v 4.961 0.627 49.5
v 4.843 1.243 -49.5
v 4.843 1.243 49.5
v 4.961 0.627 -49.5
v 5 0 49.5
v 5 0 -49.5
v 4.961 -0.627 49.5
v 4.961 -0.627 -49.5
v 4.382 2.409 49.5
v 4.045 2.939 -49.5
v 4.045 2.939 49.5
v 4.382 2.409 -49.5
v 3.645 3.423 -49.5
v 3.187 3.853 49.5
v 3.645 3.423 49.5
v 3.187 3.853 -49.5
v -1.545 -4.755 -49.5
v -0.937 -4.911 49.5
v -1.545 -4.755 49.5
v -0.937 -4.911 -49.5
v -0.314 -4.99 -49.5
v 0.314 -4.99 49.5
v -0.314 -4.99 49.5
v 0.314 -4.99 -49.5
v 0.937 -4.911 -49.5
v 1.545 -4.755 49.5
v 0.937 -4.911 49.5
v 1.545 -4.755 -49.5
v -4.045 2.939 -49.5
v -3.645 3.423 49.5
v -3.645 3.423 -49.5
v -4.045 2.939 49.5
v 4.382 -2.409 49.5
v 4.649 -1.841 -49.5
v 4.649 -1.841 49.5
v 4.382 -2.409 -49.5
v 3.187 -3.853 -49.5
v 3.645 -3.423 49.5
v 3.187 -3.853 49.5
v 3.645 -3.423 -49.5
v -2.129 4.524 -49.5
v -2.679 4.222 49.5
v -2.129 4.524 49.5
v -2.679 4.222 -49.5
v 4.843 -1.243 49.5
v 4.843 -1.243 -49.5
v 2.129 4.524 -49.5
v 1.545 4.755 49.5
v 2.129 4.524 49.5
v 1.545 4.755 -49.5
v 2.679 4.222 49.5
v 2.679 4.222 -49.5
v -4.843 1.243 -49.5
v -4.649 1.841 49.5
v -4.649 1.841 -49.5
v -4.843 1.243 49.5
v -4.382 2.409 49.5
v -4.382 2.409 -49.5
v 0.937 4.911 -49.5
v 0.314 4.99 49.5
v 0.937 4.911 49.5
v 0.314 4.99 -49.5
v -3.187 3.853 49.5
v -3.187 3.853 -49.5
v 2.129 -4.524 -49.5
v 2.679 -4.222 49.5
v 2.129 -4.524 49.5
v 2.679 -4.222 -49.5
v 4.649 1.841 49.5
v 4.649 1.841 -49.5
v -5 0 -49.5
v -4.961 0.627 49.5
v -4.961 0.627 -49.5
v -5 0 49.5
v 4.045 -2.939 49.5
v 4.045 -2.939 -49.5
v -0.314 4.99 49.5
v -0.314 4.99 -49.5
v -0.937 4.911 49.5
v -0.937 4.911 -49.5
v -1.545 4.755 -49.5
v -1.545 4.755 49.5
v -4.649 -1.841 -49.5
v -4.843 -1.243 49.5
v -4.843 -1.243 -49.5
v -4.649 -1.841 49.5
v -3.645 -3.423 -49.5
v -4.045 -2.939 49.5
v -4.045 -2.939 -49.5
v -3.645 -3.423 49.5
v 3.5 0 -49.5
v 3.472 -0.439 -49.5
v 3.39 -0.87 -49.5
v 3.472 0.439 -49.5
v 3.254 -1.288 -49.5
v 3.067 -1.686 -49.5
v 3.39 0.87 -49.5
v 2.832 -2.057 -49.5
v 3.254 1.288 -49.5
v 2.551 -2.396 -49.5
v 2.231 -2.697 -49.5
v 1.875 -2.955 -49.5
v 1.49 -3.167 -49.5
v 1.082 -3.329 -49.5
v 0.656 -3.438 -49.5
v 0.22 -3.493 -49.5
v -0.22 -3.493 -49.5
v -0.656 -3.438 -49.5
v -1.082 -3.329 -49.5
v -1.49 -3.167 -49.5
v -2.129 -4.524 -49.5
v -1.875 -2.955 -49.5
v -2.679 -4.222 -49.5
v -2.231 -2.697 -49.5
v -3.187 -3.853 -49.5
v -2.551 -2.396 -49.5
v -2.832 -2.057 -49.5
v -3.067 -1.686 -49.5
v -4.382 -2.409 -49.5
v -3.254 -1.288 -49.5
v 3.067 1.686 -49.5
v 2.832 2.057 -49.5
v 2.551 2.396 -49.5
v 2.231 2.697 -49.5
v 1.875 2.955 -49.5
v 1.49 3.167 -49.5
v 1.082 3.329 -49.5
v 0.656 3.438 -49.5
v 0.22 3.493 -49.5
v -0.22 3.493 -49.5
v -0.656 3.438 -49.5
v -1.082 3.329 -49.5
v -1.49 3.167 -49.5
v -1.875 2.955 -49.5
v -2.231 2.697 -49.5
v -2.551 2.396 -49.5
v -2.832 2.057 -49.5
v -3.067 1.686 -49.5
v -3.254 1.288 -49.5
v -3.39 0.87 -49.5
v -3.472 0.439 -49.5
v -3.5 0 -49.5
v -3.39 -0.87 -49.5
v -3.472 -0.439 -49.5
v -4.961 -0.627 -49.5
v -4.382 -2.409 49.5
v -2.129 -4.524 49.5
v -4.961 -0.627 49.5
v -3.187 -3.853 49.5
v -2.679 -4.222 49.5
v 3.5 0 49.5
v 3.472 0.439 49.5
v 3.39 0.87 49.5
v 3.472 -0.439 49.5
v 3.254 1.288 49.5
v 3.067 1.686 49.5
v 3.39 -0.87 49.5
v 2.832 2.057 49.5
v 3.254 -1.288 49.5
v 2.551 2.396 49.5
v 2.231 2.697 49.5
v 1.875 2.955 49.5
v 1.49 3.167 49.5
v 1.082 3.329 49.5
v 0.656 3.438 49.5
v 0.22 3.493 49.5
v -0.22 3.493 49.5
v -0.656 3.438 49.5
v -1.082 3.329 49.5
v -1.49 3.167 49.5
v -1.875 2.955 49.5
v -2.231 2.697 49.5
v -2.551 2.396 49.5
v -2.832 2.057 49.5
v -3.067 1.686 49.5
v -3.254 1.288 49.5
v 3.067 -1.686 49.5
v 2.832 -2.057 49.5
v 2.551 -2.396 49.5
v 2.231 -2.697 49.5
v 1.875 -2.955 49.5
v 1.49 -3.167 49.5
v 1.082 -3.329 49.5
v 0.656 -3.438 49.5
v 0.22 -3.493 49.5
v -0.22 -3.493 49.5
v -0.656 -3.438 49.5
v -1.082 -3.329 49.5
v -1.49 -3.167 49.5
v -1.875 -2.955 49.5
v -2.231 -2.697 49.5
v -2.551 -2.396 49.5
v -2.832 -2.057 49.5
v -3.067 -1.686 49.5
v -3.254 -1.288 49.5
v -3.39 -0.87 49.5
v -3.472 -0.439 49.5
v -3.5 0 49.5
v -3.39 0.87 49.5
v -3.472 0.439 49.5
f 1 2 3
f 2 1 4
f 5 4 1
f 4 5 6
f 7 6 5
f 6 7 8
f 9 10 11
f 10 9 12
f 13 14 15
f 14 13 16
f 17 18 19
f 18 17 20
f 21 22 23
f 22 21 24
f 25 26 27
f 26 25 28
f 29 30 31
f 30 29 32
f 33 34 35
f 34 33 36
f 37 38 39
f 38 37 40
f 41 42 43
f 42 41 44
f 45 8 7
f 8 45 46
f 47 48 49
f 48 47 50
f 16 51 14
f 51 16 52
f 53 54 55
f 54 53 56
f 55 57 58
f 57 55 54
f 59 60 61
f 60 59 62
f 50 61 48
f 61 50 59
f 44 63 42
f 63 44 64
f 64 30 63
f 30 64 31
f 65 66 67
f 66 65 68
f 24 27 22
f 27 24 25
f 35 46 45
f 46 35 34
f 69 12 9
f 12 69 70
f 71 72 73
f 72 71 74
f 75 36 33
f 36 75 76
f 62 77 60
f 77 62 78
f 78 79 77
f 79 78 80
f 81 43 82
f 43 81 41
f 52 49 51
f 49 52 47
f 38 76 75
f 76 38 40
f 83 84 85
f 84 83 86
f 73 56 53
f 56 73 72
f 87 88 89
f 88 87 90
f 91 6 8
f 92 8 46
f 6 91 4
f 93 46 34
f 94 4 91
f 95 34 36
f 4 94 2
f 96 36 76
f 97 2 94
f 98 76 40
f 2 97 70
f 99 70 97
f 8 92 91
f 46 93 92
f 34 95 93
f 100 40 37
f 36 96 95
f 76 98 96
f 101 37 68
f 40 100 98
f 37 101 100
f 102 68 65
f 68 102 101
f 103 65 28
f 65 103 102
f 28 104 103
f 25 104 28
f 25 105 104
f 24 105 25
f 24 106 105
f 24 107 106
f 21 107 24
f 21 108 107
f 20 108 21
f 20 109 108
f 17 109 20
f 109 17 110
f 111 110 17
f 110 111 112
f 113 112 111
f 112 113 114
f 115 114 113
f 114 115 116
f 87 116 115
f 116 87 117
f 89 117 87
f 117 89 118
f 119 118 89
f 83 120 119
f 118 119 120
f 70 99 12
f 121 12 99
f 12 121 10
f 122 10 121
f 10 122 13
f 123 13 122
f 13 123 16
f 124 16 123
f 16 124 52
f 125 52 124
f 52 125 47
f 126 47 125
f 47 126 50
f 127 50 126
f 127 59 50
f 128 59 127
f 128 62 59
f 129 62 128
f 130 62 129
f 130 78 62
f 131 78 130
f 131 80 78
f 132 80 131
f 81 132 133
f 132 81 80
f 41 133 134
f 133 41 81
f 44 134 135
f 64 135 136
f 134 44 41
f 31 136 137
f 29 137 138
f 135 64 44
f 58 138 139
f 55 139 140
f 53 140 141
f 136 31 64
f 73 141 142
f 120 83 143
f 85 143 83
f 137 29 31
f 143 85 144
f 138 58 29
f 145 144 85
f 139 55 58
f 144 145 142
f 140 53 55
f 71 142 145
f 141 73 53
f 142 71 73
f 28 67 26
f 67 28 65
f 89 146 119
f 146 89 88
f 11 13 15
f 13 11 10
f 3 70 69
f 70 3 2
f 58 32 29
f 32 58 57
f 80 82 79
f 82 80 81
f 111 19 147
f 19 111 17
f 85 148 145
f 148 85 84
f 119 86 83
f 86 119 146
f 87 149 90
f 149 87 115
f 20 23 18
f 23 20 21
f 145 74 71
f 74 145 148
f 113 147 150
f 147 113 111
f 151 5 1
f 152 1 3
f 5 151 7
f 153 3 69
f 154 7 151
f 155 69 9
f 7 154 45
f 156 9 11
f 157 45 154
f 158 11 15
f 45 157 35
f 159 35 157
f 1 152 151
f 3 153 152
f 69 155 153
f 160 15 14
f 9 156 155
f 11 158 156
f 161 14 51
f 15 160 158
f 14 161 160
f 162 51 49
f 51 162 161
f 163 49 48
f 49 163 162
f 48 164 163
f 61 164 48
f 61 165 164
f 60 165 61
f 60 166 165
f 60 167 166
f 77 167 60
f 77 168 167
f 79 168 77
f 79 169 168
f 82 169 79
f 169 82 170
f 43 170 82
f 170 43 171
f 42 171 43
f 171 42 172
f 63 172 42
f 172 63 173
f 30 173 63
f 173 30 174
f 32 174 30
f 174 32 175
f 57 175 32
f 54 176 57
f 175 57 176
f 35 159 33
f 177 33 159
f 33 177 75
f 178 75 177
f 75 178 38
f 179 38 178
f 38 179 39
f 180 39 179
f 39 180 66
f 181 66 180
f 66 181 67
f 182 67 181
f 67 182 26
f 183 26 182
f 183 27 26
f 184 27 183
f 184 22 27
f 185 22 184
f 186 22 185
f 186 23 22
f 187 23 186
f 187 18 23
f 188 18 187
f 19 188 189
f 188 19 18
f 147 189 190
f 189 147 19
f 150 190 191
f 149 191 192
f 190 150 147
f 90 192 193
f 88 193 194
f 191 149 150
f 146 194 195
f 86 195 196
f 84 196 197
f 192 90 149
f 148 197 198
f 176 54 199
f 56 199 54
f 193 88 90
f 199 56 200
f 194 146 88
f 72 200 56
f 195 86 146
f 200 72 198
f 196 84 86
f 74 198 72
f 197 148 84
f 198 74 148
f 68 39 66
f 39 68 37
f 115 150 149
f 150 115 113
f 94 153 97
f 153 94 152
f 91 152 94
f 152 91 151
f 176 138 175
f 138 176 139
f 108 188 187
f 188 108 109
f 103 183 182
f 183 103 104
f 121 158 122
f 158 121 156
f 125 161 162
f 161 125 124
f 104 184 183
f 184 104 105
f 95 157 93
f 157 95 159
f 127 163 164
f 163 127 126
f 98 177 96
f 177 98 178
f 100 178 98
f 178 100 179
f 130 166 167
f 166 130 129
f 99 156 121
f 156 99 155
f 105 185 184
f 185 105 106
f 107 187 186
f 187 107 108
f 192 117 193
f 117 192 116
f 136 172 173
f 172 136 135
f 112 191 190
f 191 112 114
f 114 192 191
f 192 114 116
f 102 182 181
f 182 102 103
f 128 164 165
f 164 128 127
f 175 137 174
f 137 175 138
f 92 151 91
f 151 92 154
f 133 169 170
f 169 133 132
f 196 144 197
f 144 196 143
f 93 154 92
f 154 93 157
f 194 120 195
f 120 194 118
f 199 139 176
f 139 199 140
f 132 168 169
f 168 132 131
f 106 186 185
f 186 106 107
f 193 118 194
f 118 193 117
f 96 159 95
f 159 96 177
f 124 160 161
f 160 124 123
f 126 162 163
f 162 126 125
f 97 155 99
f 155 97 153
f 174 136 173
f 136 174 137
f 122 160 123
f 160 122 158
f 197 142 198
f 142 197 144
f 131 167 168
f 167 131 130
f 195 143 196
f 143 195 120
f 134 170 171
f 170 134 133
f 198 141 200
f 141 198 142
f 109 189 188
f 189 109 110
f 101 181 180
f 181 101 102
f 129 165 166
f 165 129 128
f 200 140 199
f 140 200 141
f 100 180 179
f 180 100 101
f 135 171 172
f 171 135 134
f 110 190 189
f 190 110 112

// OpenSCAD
$fn = 50;


difference() {
	union() {
		translate(v = [0, 0, -49.5000000000]) {
			cylinder(h = 99, r = 5.0000000000);
		}
	}
	union() {
		translate(v = [0, 0, -100.0000000000]) {
			cylinder(h = 200, r = 3.5000000000);
		}
	}
}
